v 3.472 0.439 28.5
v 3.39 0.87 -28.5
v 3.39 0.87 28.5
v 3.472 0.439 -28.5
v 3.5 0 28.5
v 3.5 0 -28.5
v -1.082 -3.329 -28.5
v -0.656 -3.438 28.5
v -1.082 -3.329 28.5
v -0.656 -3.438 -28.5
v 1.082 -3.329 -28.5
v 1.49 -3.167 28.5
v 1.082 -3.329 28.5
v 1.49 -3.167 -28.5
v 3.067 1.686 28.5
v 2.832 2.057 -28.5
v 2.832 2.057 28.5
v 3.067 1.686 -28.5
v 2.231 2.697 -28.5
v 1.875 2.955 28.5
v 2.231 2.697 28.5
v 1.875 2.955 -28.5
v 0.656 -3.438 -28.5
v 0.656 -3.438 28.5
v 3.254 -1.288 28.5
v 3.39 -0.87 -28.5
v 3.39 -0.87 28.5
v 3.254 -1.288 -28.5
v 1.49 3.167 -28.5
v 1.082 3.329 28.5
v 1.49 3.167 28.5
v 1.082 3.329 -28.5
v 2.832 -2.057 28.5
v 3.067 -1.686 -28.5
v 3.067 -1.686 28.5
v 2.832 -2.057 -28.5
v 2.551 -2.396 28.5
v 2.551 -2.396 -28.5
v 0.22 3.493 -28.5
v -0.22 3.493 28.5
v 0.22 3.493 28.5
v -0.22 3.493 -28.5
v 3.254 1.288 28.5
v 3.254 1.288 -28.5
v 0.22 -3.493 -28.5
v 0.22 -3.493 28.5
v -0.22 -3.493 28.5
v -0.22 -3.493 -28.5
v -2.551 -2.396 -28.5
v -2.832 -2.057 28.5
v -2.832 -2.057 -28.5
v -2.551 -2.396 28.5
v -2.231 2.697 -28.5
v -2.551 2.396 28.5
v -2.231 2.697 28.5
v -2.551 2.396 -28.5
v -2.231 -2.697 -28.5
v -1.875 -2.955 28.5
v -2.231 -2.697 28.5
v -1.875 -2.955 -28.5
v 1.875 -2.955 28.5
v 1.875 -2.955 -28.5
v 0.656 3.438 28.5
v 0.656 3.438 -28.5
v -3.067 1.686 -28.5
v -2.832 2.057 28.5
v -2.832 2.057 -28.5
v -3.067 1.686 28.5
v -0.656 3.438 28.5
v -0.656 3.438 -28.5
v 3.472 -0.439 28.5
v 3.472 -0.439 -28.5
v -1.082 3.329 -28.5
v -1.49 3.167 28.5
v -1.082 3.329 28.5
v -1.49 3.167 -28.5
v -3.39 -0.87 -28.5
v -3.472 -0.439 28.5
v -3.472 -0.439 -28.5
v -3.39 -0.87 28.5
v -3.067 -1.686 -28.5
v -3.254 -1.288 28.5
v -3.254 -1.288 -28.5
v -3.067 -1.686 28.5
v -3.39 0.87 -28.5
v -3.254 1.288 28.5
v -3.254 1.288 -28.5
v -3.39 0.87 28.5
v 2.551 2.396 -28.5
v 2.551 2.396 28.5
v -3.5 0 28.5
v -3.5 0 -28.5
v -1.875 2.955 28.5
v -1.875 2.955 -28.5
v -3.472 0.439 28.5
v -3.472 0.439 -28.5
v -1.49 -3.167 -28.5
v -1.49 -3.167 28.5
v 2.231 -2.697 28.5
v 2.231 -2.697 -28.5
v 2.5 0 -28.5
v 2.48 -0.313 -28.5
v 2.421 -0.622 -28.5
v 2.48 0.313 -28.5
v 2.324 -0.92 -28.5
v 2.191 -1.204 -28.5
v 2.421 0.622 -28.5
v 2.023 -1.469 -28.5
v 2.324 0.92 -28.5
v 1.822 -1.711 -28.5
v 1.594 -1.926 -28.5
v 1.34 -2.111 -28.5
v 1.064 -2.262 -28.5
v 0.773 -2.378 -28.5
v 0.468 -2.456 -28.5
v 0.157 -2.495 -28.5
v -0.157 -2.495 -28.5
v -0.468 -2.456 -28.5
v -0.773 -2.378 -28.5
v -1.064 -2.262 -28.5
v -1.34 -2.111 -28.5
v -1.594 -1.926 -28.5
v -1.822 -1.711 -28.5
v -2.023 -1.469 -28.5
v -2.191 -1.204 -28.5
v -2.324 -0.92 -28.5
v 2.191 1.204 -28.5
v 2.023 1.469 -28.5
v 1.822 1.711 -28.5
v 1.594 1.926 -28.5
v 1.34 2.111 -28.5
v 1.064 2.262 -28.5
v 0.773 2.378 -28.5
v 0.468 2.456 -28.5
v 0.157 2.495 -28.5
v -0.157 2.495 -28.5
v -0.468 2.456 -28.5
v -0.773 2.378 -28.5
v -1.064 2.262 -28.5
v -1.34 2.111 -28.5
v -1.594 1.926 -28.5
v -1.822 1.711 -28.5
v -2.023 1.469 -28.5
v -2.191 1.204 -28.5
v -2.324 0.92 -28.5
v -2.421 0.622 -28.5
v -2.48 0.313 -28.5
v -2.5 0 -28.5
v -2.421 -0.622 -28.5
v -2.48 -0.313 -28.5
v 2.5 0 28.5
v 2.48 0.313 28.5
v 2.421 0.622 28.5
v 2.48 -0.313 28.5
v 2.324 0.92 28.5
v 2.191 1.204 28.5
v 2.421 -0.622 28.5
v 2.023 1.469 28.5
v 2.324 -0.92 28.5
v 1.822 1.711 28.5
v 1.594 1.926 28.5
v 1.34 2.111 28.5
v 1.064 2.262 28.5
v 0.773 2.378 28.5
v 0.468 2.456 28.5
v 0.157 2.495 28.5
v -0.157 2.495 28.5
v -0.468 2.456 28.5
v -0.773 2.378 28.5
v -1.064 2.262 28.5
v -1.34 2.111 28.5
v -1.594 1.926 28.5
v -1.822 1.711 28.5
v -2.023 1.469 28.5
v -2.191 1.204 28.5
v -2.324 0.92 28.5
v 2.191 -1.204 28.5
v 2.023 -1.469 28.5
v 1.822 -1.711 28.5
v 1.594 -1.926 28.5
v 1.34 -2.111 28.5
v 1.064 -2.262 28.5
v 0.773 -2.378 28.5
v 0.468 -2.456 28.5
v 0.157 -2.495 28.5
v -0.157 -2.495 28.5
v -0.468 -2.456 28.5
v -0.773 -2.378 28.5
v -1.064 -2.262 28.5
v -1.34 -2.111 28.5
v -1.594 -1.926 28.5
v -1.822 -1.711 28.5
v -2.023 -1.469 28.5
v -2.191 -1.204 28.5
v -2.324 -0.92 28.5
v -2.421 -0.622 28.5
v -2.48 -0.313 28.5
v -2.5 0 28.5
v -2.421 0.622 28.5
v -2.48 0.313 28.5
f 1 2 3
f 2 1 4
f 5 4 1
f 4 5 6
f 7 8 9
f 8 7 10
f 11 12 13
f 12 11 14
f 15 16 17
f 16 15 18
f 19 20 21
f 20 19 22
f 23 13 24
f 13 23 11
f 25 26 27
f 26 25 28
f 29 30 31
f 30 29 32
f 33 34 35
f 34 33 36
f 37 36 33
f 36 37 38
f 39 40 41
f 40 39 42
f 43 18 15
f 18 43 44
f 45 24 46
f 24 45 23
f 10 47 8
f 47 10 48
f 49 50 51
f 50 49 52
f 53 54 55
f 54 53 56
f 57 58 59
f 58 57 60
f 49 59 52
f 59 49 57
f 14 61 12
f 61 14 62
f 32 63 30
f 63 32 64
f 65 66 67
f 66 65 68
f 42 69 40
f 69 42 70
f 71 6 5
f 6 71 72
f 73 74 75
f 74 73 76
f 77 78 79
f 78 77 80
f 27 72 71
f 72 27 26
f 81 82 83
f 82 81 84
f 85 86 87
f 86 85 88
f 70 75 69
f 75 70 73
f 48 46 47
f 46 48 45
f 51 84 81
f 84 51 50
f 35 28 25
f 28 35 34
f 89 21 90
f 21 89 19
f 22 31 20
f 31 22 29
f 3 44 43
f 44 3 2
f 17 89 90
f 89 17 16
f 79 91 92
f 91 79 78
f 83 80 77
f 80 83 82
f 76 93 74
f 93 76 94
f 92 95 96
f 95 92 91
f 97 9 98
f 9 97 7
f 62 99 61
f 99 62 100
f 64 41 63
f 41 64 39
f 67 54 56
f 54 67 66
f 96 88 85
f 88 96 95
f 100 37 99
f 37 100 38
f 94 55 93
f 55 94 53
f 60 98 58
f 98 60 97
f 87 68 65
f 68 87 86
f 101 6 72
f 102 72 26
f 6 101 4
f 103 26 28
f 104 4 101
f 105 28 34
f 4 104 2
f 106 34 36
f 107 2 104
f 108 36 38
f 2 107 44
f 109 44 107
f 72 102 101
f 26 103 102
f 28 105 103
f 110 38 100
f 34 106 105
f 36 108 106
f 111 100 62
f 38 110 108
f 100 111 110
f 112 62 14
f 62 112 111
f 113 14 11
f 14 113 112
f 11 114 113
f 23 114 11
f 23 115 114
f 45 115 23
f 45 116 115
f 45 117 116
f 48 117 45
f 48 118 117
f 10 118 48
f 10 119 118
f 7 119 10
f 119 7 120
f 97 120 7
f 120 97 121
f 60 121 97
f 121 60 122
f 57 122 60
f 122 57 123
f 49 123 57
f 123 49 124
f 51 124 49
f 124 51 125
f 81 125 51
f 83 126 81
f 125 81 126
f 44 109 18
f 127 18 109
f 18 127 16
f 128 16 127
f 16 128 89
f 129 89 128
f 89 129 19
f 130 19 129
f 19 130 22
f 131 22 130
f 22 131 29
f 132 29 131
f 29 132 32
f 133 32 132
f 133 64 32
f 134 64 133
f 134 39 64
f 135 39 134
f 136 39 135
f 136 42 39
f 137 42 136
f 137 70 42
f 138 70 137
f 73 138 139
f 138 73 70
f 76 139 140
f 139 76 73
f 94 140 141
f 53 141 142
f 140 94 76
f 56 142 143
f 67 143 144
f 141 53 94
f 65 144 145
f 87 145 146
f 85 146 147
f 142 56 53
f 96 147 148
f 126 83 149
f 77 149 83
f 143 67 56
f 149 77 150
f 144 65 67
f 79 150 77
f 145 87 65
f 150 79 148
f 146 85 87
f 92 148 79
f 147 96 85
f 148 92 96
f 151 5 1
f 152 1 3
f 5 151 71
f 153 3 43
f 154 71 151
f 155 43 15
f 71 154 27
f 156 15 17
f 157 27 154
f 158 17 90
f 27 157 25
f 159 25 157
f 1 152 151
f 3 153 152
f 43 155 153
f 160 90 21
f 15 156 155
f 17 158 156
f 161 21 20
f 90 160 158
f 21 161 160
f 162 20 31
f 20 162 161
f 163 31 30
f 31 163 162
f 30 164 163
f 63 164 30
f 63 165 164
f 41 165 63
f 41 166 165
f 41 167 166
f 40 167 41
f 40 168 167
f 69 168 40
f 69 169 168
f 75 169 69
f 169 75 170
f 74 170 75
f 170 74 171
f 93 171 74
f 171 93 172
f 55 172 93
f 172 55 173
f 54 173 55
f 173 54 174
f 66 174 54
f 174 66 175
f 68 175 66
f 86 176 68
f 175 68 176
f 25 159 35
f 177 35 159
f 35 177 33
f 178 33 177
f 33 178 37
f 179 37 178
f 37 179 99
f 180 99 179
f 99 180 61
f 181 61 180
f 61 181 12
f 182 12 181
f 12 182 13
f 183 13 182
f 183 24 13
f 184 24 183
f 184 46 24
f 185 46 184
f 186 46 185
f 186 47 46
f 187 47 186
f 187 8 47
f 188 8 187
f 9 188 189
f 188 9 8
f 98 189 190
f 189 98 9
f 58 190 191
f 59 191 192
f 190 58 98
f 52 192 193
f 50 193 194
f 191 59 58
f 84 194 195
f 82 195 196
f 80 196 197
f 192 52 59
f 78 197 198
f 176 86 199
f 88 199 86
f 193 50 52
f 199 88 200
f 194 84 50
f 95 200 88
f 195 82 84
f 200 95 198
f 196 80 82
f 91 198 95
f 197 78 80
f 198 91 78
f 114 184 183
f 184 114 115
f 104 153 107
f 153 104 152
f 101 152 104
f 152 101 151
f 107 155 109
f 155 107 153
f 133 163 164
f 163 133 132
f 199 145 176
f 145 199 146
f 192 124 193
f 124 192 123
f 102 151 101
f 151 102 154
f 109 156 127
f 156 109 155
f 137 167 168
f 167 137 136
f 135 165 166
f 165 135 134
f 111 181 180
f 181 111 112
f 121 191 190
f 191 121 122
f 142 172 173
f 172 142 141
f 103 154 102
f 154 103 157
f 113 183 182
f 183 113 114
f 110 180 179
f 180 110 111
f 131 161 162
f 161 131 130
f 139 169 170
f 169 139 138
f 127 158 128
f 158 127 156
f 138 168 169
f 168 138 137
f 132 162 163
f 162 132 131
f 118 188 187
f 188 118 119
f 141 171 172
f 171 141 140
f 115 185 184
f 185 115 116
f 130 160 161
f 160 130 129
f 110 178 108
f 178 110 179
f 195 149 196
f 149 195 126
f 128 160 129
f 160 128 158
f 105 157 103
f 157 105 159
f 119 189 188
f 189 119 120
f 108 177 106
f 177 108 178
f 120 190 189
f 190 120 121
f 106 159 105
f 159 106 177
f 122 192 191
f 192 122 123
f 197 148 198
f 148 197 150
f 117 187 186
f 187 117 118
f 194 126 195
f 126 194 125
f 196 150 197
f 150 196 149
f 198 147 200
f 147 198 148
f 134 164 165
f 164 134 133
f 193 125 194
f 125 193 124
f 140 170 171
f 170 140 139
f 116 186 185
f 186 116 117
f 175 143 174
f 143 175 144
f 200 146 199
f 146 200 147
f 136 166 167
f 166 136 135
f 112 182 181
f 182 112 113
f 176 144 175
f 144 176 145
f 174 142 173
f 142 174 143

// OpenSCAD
$fn = 50;


difference() {
	union() {
		translate(v = [0, 0, -28.5000000000]) {
			cylinder(h = 57, r = 3.5000000000);
		}
	}
	union() {
		translate(v = [0, 0, -100.0000000000]) {
			cylinder(h = 200, r = 2.5000000000);
		}
	}
}
